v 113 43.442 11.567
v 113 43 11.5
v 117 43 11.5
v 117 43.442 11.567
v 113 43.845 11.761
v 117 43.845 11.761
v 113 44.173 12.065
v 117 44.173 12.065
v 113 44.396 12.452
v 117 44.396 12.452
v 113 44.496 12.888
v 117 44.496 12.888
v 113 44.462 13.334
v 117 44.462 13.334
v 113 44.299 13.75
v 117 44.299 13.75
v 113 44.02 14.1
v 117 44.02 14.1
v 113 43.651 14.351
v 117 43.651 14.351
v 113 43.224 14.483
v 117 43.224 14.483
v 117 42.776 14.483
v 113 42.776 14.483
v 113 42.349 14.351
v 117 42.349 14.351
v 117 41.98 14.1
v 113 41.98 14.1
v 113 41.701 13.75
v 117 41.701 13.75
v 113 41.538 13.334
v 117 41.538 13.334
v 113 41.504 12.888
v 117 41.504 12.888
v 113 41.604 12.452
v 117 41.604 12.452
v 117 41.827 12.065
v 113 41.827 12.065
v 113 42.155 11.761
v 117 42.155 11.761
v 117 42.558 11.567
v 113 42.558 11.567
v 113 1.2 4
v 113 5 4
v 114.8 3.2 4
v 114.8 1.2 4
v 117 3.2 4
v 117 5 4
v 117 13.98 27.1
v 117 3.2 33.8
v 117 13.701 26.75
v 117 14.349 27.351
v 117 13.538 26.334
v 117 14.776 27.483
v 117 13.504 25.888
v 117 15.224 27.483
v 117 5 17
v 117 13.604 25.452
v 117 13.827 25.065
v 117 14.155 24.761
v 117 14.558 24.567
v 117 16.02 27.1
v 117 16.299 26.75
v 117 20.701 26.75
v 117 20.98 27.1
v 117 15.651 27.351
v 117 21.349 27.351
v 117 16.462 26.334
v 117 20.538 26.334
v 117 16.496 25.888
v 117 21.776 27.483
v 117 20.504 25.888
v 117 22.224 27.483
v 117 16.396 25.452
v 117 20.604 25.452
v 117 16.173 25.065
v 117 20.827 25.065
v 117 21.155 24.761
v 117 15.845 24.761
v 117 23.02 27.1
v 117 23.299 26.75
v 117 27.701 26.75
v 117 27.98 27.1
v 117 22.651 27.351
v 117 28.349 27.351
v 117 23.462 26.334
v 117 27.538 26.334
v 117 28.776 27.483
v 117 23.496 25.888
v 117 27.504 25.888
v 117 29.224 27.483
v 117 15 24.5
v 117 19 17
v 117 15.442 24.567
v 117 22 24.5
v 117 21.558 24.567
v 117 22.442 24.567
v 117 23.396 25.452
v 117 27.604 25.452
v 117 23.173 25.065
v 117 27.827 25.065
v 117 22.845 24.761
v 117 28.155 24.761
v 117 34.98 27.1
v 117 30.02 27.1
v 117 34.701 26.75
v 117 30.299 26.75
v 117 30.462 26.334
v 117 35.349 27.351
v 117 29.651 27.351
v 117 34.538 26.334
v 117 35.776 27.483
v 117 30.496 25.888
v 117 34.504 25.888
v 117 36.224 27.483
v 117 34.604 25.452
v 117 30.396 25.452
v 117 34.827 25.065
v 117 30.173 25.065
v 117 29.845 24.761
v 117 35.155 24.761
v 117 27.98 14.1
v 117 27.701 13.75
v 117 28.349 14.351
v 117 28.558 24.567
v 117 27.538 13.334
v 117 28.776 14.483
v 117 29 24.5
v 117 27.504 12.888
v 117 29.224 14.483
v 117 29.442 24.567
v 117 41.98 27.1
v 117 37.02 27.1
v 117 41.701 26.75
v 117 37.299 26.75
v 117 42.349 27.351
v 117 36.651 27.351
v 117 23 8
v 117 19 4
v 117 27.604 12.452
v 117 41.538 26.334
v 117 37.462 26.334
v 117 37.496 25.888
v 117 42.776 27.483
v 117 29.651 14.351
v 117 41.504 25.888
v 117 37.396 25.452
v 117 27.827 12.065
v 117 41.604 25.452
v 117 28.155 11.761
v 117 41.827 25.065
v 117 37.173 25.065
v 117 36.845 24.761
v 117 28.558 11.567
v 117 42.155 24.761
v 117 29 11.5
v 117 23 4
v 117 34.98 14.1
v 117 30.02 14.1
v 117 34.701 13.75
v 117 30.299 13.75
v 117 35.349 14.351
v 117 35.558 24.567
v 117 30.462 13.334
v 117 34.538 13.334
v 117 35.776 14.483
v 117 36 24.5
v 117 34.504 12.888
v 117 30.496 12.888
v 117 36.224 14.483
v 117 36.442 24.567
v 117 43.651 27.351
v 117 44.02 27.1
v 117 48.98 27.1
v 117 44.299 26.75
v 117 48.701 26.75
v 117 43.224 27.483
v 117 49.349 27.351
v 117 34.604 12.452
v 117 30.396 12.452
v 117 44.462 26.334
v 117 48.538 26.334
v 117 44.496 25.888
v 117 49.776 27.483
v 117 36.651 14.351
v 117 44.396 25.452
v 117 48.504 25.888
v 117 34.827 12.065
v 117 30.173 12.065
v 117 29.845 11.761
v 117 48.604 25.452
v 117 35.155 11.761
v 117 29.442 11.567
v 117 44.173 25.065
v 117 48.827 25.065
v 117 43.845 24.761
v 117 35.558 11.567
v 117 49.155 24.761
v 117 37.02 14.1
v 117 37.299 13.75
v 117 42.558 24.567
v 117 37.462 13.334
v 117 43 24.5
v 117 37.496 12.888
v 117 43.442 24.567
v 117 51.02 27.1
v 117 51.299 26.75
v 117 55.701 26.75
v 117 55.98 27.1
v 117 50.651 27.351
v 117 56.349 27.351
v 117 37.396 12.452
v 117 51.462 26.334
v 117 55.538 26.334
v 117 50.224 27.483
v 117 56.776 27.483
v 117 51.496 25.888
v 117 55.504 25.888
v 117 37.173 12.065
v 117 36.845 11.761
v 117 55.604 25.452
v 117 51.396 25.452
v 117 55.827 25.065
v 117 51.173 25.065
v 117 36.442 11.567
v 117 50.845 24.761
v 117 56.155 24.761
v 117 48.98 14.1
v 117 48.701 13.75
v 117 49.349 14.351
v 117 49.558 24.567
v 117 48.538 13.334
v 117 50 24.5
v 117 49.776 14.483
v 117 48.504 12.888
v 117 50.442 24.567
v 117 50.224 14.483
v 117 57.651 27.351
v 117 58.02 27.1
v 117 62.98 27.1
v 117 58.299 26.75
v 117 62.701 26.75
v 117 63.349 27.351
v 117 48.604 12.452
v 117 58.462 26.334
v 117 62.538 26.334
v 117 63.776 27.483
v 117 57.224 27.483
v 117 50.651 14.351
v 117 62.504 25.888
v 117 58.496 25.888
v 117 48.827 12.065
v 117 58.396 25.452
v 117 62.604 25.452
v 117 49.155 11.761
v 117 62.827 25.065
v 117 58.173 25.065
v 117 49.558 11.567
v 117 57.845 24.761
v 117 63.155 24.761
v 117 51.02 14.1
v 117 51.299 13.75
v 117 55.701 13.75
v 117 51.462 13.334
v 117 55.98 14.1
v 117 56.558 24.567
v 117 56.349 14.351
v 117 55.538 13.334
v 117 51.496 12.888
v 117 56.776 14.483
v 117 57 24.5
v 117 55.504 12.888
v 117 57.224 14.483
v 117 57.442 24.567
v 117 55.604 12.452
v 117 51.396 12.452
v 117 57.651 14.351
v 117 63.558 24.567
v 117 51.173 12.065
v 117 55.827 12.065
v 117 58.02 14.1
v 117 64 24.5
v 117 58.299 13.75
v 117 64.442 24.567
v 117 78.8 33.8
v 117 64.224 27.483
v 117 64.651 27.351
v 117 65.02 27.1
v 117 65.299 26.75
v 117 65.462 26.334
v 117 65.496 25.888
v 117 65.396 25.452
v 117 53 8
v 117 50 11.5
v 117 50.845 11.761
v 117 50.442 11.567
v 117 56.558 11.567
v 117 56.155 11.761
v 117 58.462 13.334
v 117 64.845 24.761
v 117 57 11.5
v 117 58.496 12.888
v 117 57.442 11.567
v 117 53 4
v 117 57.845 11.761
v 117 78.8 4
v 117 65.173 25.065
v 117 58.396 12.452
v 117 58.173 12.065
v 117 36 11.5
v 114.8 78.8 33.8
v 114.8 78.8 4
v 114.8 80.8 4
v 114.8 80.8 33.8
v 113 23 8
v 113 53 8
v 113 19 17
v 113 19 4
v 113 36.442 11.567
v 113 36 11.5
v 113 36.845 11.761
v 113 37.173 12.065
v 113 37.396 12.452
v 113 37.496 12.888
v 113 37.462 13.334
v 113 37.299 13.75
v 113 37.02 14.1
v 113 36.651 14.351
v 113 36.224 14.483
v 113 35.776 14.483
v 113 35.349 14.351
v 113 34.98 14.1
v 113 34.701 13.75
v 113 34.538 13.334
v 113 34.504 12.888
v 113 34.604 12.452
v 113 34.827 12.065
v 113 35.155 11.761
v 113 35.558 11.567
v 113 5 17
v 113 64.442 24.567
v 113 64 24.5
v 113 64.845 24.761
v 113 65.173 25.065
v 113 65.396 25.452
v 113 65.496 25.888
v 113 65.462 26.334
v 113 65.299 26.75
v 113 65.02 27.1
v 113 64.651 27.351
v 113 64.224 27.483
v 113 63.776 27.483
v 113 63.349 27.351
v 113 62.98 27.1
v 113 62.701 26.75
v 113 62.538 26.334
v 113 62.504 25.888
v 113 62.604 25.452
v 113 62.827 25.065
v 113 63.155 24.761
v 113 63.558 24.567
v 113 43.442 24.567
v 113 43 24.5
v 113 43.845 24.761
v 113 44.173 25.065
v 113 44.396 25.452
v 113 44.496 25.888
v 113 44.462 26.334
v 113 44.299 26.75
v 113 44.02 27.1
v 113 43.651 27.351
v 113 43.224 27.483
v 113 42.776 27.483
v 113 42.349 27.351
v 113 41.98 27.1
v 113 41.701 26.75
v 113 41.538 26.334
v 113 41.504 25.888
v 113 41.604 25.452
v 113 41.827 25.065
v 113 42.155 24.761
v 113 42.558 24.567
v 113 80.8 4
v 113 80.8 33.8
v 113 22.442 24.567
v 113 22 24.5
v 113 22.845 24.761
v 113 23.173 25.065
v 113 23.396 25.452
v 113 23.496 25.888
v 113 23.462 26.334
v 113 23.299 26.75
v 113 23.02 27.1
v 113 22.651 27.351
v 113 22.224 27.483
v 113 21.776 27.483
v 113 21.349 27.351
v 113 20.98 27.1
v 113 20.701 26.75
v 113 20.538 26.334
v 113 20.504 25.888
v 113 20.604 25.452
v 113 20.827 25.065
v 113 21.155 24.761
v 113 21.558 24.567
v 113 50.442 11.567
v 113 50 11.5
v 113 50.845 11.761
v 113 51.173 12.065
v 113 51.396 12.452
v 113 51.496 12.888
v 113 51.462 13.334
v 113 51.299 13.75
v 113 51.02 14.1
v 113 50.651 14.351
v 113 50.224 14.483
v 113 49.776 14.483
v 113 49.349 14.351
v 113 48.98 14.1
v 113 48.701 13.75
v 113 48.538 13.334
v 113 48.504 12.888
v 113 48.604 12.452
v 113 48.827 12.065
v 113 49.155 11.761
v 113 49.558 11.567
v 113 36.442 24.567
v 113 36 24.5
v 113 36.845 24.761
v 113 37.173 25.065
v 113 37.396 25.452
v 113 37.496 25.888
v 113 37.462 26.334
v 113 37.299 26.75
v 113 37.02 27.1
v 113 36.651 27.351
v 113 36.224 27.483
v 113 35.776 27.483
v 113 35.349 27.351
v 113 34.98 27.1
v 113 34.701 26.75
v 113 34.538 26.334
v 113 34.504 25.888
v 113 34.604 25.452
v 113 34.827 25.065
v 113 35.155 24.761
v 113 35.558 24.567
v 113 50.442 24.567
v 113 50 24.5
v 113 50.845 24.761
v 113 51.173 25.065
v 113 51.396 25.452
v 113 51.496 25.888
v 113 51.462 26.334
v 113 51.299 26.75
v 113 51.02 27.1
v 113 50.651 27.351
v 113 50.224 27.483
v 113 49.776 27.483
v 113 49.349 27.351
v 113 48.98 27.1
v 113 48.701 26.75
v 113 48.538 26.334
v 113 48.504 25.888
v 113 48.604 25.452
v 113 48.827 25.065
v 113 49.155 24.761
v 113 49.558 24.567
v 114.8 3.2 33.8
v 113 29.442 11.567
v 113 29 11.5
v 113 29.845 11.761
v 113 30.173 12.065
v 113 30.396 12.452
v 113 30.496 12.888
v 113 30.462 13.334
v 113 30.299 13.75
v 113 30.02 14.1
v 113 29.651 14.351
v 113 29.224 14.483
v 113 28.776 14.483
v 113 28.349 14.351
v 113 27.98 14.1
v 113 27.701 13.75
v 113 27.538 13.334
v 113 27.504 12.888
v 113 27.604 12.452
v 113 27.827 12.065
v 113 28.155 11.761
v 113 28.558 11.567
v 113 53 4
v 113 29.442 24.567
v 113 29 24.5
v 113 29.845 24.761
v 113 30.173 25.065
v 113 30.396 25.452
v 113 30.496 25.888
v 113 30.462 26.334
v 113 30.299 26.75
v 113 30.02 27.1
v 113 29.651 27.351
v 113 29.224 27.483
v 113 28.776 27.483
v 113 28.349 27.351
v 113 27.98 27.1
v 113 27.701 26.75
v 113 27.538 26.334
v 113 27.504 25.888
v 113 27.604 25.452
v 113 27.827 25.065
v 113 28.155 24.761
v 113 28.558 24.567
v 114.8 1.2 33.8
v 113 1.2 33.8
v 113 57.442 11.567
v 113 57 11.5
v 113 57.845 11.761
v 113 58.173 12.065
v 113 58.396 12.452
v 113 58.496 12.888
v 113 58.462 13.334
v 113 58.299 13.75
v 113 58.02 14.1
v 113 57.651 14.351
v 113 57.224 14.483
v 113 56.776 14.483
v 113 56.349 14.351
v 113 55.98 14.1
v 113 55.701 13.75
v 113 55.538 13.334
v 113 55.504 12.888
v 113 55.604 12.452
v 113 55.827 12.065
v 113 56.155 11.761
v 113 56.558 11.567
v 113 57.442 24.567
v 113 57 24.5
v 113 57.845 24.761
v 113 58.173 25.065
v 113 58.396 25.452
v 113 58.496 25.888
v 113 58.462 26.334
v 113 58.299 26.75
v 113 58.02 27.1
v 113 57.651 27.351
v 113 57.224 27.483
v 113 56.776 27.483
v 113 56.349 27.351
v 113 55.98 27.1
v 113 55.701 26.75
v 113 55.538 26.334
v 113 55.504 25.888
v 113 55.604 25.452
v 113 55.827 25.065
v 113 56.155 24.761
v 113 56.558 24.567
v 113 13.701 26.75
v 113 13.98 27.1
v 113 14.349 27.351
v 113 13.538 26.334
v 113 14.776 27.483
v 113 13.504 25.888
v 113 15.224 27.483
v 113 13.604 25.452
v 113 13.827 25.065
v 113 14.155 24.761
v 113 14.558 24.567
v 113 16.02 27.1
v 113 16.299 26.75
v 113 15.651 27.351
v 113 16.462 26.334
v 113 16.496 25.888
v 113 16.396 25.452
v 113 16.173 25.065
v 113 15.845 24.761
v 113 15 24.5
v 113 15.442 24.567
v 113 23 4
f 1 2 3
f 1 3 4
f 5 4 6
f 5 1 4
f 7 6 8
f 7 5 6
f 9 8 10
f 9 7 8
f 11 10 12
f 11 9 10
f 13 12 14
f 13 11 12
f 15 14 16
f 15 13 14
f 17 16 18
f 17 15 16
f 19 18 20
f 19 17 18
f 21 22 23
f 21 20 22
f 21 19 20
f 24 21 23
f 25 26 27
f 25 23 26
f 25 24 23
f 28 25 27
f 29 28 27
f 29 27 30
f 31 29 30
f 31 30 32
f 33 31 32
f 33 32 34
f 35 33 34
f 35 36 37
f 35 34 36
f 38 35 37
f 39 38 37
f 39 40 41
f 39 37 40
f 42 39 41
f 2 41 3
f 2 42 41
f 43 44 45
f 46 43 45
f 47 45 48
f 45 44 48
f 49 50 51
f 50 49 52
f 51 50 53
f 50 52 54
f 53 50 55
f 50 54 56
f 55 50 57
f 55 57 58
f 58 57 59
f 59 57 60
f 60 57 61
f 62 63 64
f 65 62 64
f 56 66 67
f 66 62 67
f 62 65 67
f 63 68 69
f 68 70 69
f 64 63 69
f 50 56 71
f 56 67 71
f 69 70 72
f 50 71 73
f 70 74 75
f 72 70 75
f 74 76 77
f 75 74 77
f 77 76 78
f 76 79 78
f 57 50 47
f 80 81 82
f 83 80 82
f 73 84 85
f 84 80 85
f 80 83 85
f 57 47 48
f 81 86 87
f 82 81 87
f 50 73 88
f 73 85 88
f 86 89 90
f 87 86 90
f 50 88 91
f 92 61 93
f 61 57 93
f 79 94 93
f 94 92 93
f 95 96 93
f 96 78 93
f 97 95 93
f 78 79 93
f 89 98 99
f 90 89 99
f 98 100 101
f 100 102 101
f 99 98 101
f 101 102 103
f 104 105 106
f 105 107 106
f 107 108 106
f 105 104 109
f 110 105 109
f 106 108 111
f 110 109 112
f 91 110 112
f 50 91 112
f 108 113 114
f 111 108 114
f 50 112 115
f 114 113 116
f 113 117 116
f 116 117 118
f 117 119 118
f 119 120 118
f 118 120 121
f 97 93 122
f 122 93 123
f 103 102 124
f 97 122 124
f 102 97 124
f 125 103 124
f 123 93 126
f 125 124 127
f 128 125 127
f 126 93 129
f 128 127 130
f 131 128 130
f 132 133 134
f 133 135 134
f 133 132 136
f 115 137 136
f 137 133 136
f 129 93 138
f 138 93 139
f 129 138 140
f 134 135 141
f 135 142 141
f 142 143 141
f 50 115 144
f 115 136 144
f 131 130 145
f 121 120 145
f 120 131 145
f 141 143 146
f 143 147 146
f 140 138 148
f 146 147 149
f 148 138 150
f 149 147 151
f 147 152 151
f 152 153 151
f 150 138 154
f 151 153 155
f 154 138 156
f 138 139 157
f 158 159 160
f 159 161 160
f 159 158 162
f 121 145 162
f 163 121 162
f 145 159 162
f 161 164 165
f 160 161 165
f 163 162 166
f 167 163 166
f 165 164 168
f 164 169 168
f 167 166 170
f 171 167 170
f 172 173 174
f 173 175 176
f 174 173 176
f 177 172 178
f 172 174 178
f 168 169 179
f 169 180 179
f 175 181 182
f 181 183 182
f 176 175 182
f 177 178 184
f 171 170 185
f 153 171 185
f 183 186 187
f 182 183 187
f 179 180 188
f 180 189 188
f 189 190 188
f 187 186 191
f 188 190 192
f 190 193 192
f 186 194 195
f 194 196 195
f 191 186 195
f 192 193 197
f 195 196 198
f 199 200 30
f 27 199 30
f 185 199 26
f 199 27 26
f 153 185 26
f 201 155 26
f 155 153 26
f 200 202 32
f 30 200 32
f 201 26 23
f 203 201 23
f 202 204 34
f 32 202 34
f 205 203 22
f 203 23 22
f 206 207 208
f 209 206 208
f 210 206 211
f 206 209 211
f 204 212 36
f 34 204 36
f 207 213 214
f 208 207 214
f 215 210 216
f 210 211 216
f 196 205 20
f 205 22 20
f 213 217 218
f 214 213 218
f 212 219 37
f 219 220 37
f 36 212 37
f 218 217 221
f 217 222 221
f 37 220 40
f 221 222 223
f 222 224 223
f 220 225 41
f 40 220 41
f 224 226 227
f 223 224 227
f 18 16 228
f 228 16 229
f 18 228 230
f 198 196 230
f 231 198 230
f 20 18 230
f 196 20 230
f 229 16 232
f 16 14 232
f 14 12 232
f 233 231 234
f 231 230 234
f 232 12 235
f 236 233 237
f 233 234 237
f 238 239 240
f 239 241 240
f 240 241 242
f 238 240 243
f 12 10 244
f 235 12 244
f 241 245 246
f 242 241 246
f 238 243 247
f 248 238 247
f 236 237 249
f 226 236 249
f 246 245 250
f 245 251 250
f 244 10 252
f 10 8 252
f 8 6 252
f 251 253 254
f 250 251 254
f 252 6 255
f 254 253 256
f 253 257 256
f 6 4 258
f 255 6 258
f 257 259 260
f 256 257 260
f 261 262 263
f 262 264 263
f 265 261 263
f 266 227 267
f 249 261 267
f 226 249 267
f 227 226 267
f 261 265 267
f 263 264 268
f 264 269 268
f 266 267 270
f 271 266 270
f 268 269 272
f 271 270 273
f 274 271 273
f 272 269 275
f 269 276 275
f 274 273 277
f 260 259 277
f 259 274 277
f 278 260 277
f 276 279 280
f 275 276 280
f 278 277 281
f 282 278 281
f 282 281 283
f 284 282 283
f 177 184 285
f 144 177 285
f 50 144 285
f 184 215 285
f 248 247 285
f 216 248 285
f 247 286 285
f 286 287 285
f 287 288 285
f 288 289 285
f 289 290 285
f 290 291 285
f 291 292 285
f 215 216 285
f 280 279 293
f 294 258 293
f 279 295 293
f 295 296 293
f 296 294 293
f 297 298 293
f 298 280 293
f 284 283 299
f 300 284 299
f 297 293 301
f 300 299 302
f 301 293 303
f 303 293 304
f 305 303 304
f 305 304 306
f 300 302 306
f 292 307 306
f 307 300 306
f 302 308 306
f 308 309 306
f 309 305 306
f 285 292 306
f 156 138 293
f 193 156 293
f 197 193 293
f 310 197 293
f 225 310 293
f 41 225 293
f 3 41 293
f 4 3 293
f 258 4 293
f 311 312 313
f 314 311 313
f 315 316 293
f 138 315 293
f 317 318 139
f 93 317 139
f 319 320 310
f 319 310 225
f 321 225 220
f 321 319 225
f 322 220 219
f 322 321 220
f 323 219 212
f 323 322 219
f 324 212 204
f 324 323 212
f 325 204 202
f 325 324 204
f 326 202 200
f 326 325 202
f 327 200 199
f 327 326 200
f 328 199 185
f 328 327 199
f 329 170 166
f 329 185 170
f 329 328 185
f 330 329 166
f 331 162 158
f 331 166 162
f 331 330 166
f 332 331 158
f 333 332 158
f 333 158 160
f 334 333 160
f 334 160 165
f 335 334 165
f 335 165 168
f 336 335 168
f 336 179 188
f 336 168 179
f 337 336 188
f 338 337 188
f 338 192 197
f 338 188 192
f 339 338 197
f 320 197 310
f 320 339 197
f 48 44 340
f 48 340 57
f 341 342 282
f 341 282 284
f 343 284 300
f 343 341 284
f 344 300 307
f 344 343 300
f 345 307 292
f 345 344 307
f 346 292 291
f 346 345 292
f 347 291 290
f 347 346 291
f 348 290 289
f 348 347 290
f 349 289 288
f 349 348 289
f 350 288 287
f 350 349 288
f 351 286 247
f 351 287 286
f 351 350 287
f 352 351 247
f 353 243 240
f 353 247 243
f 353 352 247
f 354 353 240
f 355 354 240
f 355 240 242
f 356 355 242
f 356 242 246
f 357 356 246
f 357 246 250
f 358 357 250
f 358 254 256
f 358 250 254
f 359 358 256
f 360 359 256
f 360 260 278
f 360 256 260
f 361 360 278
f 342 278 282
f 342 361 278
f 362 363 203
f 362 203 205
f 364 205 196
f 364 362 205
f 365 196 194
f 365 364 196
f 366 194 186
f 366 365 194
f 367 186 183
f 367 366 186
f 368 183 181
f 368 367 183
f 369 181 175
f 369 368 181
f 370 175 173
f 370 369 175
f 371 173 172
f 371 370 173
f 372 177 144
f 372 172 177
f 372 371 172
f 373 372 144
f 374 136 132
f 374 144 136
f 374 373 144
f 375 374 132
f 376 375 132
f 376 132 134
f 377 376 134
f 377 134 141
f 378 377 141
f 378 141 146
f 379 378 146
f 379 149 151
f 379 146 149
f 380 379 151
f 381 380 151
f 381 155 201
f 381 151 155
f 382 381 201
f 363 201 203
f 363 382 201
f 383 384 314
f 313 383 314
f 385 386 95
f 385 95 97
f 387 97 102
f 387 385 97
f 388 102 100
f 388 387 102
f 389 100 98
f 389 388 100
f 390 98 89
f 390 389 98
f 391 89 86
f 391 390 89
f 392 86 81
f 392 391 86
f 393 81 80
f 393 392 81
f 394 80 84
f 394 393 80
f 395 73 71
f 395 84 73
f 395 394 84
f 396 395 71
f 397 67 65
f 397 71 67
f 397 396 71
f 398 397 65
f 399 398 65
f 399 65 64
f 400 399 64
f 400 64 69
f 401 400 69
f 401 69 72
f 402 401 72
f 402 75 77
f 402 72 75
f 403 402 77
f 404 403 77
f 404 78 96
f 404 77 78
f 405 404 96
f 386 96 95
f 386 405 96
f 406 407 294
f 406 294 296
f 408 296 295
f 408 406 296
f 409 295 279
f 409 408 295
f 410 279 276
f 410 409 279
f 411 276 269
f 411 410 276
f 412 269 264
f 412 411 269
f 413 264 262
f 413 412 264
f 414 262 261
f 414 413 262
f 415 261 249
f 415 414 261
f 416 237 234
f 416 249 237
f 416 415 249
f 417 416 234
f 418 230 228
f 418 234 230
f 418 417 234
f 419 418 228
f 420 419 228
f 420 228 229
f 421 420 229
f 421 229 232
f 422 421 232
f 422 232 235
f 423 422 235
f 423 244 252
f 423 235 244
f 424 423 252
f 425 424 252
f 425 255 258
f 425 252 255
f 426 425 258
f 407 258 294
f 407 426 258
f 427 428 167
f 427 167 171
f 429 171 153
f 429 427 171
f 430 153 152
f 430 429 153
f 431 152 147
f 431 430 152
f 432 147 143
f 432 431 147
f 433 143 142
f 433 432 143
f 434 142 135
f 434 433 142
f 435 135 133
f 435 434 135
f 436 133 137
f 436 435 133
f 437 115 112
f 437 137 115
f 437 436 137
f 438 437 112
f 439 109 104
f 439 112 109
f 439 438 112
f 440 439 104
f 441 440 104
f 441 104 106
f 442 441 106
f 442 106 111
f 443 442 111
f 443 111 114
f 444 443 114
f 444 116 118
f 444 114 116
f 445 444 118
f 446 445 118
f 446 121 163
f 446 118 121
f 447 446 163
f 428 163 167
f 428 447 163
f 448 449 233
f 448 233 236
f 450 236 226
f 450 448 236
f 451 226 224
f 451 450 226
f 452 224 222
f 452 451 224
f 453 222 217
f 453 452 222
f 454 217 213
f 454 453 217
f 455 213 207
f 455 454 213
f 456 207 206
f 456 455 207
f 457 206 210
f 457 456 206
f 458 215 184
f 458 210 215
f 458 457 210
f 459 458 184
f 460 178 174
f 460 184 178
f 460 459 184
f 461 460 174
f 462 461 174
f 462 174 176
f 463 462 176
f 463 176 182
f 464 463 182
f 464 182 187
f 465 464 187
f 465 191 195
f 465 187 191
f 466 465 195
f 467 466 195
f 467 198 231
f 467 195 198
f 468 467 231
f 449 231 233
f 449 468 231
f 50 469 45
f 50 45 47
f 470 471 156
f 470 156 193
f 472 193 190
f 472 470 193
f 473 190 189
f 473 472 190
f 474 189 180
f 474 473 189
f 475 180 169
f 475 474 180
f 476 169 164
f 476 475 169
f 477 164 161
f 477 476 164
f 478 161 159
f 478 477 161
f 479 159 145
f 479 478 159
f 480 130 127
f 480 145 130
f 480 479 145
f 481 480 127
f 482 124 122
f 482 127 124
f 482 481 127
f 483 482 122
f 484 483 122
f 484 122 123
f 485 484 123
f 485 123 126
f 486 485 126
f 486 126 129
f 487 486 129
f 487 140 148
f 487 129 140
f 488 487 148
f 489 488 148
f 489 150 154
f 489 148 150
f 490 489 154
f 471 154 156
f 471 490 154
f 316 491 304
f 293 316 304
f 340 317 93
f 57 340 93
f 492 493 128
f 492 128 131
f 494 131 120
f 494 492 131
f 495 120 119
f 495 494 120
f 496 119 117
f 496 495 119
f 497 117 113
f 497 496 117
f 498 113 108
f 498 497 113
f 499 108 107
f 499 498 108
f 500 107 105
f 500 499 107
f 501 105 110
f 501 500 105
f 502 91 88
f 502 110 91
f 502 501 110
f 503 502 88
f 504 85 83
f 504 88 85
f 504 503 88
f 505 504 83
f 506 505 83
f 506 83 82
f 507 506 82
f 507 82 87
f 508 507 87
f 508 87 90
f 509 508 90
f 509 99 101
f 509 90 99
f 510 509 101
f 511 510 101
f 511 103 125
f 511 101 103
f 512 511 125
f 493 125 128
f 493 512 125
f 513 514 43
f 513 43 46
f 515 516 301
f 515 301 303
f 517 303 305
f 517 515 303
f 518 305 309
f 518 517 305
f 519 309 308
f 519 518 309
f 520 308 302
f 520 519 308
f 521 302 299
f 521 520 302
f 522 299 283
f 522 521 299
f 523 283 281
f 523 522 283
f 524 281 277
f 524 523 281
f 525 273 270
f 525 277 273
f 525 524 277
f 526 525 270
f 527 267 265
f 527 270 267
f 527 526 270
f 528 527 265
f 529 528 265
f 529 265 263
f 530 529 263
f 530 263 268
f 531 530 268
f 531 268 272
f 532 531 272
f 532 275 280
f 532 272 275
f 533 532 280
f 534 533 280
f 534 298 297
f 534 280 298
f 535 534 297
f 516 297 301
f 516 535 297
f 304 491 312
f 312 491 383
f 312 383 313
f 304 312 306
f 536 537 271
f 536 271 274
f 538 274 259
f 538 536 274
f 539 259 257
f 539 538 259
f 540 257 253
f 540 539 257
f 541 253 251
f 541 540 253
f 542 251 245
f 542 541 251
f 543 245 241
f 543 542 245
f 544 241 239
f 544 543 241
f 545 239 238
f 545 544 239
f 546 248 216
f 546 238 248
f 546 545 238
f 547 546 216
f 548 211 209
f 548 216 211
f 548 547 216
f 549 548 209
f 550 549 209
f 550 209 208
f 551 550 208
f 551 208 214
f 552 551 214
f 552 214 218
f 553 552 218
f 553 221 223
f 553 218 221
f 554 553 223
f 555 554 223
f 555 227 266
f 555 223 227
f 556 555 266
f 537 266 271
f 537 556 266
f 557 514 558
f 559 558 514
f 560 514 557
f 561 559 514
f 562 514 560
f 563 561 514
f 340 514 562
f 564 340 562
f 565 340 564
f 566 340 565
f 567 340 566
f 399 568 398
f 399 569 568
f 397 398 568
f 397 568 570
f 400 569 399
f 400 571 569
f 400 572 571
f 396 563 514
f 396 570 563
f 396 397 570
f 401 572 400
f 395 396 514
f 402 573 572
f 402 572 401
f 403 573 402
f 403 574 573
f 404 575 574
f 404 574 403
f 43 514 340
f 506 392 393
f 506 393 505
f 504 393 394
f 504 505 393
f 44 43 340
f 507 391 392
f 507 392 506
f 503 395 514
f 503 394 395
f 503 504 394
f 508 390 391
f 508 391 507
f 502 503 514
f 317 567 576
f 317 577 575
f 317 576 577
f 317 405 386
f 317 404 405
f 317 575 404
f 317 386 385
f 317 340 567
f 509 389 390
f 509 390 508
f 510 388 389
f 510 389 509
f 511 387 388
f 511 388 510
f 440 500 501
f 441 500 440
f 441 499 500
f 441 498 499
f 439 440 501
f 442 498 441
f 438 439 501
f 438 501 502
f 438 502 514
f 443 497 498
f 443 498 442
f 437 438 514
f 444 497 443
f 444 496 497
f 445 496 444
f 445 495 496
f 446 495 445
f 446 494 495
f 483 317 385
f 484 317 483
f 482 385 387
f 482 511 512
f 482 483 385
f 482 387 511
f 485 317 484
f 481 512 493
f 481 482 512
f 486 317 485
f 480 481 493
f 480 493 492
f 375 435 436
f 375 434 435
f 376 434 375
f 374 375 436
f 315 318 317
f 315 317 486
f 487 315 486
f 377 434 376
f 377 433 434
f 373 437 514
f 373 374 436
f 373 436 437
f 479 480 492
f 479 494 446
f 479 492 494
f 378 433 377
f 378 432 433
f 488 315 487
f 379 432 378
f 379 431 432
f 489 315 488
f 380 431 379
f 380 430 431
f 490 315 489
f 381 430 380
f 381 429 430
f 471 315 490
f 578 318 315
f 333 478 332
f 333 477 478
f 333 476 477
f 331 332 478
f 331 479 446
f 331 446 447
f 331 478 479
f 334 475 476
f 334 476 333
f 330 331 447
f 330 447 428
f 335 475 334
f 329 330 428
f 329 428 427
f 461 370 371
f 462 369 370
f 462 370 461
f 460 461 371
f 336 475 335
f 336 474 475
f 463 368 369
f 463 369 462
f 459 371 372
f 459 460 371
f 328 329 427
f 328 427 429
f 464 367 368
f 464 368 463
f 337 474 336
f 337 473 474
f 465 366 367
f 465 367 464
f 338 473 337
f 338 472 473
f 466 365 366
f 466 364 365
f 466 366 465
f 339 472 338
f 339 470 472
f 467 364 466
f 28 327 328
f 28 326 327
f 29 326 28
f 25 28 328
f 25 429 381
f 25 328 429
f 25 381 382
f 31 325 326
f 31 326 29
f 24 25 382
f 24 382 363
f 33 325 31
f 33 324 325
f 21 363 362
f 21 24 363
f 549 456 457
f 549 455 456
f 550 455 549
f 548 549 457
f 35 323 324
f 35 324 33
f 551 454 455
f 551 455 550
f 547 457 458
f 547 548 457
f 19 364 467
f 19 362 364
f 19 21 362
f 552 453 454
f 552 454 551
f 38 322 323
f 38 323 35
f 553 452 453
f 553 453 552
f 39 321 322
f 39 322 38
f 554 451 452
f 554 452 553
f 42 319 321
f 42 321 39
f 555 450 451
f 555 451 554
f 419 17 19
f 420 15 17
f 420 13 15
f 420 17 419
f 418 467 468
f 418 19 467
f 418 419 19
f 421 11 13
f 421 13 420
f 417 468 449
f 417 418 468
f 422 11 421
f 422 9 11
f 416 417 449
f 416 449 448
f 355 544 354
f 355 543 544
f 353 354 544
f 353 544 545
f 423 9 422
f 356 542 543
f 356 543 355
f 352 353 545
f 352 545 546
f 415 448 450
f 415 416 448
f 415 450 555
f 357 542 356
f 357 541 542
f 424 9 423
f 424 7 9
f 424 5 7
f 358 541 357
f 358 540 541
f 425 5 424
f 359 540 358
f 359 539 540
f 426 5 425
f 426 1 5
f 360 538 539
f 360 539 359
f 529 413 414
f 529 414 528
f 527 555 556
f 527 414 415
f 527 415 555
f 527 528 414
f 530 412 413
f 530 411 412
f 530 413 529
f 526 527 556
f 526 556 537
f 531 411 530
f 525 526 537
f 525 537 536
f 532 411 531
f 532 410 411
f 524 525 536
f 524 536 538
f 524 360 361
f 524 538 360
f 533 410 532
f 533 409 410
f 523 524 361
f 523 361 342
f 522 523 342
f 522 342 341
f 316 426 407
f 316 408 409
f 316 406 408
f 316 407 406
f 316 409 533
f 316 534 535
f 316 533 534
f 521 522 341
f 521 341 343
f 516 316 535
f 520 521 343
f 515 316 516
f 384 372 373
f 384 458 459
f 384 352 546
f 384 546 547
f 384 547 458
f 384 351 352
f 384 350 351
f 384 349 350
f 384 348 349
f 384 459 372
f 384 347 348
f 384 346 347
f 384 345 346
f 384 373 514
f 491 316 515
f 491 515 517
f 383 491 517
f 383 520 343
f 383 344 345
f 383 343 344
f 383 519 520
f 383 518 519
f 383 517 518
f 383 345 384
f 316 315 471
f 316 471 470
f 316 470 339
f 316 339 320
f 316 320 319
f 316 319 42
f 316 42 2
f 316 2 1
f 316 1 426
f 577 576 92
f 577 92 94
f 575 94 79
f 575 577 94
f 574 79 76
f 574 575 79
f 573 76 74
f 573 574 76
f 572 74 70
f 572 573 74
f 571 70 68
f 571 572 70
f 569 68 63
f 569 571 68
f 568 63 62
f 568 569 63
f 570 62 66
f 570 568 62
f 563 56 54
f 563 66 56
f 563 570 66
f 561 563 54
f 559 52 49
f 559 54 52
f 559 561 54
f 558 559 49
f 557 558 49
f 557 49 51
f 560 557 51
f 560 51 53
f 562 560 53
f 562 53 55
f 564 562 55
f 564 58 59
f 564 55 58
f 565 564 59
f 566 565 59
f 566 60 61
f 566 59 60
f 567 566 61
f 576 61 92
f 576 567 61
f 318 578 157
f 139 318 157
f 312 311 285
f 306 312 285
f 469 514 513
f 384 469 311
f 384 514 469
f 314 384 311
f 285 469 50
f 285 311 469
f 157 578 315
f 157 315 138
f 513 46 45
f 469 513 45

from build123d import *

# Parameters (mm, degrees)
CYLINDER007_R     = 1.5
CYLINDER007_DEPTH = 10
ARRAY014_Y_COUNT  = 8
ARRAY014_Y_PITCH  = 7
BOX052_W          = 10
BOX052_H          = 14
BOX052_DEPTH      = 13
BOX053_W          = 10
BOX053_H          = 30
BOX053_DEPTH      = 4
CYLINDER006_R     = 1.5
CYLINDER006_DEPTH = 10
ARRAY013_Y_COUNT  = 5
ARRAY013_Y_PITCH  = 7
BOX051_W          = 10
BOX051_H          = 10
BOX051_DEPTH      = 50
BOX050_W          = 10
BOX050_H          = 10
BOX050_DEPTH      = 50
BOX049_W          = 10
BOX049_H          = 10
BOX049_DEPTH      = 50
BOX048_W          = 10
BOX048_H          = 10
BOX048_DEPTH      = 50
BOX046_W          = 2
BOX046_H          = 80
BOX046_DEPTH      = 29.8
BOX047_W          = 4
BOX047_H          = 76
BOX047_DEPTH      = 29.8


with BuildPart() as array014:
    # Cylinder007 → Cylinder007 (new body)
    with BuildSketch(Plane(origin=(110, 25, 13), x_dir=(0, 0, -1), z_dir=(1, 0, 0))):
        Circle(CYLINDER007_R)
    extrude(amount=CYLINDER007_DEPTH)

    # Array014 Y: Array014 ×8


with BuildPart() as array014_1:
    add(array014.part)
    with Locations(*[(0, i * ARRAY014_Y_PITCH, 0) for i in range(1, ARRAY014_Y_COUNT)]):
        add(array014.part)


with BuildPart() as array014_2:
    # Array014 placement: moved
    add(array014_1.part.moved(Location((0, -10, 13))))


with BuildPart() as cube012:
    # Box052 → Box052 (new body)
    with BuildSketch(Plane(origin=(111, 5, 4), x_dir=(1, 0, 0), z_dir=(0, 0, 1))):
        with Locations((5, 7)):
            Rectangle(BOX052_W, BOX052_H)
    extrude(amount=BOX052_DEPTH)


with BuildPart() as cube013:
    # Box053 → Box053 (new body)
    with BuildSketch(Plane(origin=(111, 23, 4), x_dir=(1, 0, 0), z_dir=(0, 0, 1))):
        with Locations((5, 15)):
            Rectangle(BOX053_W, BOX053_H)
    extrude(amount=BOX053_DEPTH)


with BuildPart() as fusion008032:
    # Cylinder006 → Cylinder006 (new body)
    with BuildSketch(Plane(origin=(110, 25, 13), x_dir=(0, 0, -1), z_dir=(1, 0, 0))):
        Circle(CYLINDER006_R)
    extrude(amount=CYLINDER006_DEPTH)

    # Array013 Y: Fusion008032 ×5


with BuildPart() as fusion008032_1:
    add(fusion008032.part)
    with Locations(*[(0, i * ARRAY013_Y_PITCH, 0) for i in range(1, ARRAY013_Y_COUNT)]):
        add(fusion008032.part)


with BuildPart() as fusion008032_2:
    # Array013 placement: moved
    add(fusion008032_1.part.moved(Location((0, 4, 0))))

    # Fusion008032: union Array014, Cube012, Cube013
    add(array014_2.part)
    add(cube012.part)
    add(cube013.part)


with BuildPart() as w_rfel037:
    # Box051 → Box051 (new body)
    with BuildSketch(Plane(origin=(110, 80.8, 0), x_dir=(1, 0, 0), z_dir=(0, 0, 1))):
        with Locations((5, 5)):
            Rectangle(BOX051_W, BOX051_H)
    extrude(amount=BOX051_DEPTH)


with BuildPart() as w_rfel036:
    # Box050 → Box050 (new body)
    with BuildSketch(Plane(origin=(109, -8.8, 0), x_dir=(1, 0, 0), z_dir=(0, 0, 1))):
        with Locations((5, 5)):
            Rectangle(BOX050_W, BOX050_H)
    extrude(amount=BOX050_DEPTH)


with BuildPart() as w_rfel035:
    # Box049 → Box049 (new body)
    with BuildSketch(Plane(origin=(114.8, 78.8, 0), x_dir=(1, 0, 0), z_dir=(0, 0, 1))):
        with Locations((5, 5)):
            Rectangle(BOX049_W, BOX049_H)
    extrude(amount=BOX049_DEPTH)


with BuildPart() as w_rfel034:
    # Box048 → Box048 (new body)
    with BuildSketch(Plane(origin=(114.8, -6.8, 0), x_dir=(1, 0, 0), z_dir=(0, 0, 1))):
        with Locations((5, 5)):
            Rectangle(BOX048_W, BOX048_H)
    extrude(amount=BOX048_DEPTH)


with BuildPart() as f_hrung003:
    # Box046 → Box046 (new body)
    with BuildSketch(Plane(origin=(113, 1, 23), x_dir=(1, 0, 0), z_dir=(0, 0, 1))):
        with Locations((1, 40)):
            Rectangle(BOX046_W, BOX046_H)
    extrude(amount=BOX046_DEPTH)


with BuildPart() as frontcover:
    # Box047 → Box047 (new body)
    with BuildSketch(Plane(origin=(113, 3, 23), x_dir=(1, 0, 0), z_dir=(0, 0, 1))):
        with Locations((2, 38)):
            Rectangle(BOX047_W, BOX047_H)
    extrude(amount=BOX047_DEPTH)

    # Fusion008031: union Führung003
    add(f_hrung003.part)


with BuildPart() as frontcover_1:
    # Fusion008031 placement: moved
    add(frontcover.part.moved(Location((0, 0, -19))))

    # Cut047: cut Würfel034
    add(w_rfel034.part, mode=Mode.SUBTRACT)

    # Cut048: cut Würfel035
    add(w_rfel035.part, mode=Mode.SUBTRACT)

    # Cut049: cut Würfel036
    add(w_rfel036.part, mode=Mode.SUBTRACT)

    # Cut050: cut Würfel037
    add(w_rfel037.part, mode=Mode.SUBTRACT)

    # Cut051: cut Fusion008032
    add(fusion008032_2.part, mode=Mode.SUBTRACT)


solid = frontcover_1.part
